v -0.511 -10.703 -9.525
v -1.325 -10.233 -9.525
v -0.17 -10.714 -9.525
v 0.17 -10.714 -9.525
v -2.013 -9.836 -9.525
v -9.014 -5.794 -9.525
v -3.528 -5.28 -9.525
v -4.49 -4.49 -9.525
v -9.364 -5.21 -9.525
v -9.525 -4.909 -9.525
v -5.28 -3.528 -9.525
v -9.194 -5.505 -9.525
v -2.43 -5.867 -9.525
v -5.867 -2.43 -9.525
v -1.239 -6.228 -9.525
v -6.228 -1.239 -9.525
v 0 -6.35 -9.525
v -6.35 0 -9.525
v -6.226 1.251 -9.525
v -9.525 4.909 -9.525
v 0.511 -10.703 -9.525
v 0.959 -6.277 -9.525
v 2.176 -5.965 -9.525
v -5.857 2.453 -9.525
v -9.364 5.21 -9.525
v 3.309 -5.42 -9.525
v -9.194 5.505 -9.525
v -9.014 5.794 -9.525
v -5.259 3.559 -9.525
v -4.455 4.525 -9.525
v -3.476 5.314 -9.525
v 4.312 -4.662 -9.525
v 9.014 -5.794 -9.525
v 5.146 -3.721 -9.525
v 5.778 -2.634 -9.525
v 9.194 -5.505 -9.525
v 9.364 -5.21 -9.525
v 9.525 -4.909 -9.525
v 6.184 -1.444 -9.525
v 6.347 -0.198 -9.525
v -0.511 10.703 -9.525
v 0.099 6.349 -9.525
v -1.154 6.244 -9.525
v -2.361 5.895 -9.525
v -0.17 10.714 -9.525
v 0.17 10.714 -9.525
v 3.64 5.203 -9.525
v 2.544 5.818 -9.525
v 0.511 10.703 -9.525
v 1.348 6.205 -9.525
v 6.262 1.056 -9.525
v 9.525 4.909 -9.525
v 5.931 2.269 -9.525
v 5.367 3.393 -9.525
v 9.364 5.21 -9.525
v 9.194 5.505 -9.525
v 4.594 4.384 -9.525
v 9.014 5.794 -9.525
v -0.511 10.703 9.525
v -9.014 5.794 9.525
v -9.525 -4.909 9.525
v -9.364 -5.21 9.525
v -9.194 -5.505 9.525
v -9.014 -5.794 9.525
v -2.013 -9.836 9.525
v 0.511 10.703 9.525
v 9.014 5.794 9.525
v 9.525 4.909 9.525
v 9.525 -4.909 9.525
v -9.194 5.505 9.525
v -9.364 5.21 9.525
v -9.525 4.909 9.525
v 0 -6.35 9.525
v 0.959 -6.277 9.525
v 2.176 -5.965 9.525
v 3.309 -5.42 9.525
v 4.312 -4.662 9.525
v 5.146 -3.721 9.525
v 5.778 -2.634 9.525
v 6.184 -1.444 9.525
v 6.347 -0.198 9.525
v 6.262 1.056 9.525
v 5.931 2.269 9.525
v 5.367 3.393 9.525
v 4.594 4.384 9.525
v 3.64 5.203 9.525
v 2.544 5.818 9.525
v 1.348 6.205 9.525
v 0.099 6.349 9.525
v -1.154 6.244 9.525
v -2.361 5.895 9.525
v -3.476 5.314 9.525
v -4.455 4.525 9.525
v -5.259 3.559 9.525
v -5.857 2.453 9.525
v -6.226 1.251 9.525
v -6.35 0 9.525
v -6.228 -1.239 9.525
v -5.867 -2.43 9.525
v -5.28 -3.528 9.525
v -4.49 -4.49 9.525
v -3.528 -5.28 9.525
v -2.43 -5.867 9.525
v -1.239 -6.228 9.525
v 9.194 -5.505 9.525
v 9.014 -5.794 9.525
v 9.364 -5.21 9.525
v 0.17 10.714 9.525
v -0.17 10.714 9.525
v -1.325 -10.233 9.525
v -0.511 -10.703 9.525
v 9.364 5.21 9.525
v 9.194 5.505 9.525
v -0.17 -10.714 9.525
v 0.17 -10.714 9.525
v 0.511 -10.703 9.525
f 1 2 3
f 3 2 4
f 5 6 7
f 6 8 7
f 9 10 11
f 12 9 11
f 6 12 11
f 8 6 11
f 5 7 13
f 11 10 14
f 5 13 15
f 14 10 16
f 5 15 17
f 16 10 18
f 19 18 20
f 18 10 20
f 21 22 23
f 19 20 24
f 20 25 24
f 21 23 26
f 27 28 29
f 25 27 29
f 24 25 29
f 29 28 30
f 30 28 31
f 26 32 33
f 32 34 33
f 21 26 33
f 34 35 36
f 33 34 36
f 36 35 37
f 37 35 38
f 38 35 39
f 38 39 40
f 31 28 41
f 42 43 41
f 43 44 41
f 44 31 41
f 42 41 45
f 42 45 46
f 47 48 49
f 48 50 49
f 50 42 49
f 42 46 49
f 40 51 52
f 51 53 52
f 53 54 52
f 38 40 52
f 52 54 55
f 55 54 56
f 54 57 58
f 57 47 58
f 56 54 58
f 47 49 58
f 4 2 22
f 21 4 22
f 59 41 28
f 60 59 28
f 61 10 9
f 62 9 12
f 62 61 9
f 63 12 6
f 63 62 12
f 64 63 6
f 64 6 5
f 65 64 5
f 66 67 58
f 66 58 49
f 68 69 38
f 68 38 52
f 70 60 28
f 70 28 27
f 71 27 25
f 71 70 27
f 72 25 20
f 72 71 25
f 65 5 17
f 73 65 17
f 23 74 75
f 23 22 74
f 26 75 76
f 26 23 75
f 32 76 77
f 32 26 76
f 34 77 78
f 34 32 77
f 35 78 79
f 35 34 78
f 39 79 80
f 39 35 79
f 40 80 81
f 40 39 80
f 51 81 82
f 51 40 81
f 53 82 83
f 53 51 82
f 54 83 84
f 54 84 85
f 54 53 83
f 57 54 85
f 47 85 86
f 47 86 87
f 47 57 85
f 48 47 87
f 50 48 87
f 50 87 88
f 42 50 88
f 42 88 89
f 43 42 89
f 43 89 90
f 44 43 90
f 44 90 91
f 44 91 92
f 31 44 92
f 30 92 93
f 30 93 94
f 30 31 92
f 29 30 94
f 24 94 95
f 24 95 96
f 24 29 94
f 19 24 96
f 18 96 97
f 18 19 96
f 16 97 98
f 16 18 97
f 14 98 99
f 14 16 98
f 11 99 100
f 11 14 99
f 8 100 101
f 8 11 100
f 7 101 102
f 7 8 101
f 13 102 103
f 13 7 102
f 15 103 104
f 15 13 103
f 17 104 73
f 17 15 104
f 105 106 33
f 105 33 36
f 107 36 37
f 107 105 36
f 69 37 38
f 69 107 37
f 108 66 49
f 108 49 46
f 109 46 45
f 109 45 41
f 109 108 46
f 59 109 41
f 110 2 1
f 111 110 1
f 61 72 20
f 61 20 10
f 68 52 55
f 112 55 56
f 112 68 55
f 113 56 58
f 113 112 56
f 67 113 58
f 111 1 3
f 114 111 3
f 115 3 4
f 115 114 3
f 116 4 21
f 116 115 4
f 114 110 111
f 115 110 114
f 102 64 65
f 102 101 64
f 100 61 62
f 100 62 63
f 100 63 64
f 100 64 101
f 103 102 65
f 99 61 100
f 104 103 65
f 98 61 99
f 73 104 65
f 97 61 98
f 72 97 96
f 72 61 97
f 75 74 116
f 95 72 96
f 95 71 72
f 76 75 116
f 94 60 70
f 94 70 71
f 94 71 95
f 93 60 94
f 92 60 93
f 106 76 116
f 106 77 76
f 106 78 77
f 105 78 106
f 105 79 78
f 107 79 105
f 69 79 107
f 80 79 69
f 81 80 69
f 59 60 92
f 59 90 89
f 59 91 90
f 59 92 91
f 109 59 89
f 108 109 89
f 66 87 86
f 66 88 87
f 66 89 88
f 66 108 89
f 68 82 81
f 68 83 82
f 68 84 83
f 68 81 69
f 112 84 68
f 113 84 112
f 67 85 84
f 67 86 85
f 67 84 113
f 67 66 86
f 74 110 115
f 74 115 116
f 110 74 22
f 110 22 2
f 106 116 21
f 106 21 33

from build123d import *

# Parameters (mm, degrees)
SKETCH1_R         = 6.35
EXTRUDE1_DEPTH    = 9.525
SKETCH2_OUTSIDE_W = 28.006
SKETCH2_OUTSIDE_H = 30.954
SKETCH2_OUTSIDE_R = 10.715625
EXTRUDE2_DEPTH    = 24.970724332
EXTRUDE3_DEPTH    = 24.842247045


with BuildPart() as part:
    # Sketch1 → Extrude1 (new, symmetric)
    with BuildSketch(Plane.XY):
        Polygon((0, 10.998522628), (-9.525, 5.499261314), (-9.525, -5.499261314), (0, -10.998522628), (9.525, -5.499261314), (9.525, 5.499261314), align=None)
        with Locations(Location((0, 0, 0), (0, 0, 180))):
            Circle(SKETCH1_R, mode=Mode.SUBTRACT)
    extrude(amount=EXTRUDE1_DEPTH, both=True)

    # Sketch2 outside → Extrude2 (cut, through all)
    with BuildSketch(Plane.XY.offset(9.525)):
        Rectangle(SKETCH2_OUTSIDE_W, SKETCH2_OUTSIDE_H)
        Circle(SKETCH2_OUTSIDE_R, mode=Mode.SUBTRACT)
    extrude(amount=-EXTRUDE2_DEPTH, mode=Mode.SUBTRACT)

    # Sketch3 → Extrude3 (cut, through all)
    with BuildSketch(Plane.XY.offset(9.525)):
        Polygon((3.437038321, -1.984375), (-1.325461679, -10.233266971), (-2.012869343, -9.836391971), (2.749630657, -1.5875), align=None)
    extrude(amount=-EXTRUDE3_DEPTH, mode=Mode.SUBTRACT)


solid = part.part
